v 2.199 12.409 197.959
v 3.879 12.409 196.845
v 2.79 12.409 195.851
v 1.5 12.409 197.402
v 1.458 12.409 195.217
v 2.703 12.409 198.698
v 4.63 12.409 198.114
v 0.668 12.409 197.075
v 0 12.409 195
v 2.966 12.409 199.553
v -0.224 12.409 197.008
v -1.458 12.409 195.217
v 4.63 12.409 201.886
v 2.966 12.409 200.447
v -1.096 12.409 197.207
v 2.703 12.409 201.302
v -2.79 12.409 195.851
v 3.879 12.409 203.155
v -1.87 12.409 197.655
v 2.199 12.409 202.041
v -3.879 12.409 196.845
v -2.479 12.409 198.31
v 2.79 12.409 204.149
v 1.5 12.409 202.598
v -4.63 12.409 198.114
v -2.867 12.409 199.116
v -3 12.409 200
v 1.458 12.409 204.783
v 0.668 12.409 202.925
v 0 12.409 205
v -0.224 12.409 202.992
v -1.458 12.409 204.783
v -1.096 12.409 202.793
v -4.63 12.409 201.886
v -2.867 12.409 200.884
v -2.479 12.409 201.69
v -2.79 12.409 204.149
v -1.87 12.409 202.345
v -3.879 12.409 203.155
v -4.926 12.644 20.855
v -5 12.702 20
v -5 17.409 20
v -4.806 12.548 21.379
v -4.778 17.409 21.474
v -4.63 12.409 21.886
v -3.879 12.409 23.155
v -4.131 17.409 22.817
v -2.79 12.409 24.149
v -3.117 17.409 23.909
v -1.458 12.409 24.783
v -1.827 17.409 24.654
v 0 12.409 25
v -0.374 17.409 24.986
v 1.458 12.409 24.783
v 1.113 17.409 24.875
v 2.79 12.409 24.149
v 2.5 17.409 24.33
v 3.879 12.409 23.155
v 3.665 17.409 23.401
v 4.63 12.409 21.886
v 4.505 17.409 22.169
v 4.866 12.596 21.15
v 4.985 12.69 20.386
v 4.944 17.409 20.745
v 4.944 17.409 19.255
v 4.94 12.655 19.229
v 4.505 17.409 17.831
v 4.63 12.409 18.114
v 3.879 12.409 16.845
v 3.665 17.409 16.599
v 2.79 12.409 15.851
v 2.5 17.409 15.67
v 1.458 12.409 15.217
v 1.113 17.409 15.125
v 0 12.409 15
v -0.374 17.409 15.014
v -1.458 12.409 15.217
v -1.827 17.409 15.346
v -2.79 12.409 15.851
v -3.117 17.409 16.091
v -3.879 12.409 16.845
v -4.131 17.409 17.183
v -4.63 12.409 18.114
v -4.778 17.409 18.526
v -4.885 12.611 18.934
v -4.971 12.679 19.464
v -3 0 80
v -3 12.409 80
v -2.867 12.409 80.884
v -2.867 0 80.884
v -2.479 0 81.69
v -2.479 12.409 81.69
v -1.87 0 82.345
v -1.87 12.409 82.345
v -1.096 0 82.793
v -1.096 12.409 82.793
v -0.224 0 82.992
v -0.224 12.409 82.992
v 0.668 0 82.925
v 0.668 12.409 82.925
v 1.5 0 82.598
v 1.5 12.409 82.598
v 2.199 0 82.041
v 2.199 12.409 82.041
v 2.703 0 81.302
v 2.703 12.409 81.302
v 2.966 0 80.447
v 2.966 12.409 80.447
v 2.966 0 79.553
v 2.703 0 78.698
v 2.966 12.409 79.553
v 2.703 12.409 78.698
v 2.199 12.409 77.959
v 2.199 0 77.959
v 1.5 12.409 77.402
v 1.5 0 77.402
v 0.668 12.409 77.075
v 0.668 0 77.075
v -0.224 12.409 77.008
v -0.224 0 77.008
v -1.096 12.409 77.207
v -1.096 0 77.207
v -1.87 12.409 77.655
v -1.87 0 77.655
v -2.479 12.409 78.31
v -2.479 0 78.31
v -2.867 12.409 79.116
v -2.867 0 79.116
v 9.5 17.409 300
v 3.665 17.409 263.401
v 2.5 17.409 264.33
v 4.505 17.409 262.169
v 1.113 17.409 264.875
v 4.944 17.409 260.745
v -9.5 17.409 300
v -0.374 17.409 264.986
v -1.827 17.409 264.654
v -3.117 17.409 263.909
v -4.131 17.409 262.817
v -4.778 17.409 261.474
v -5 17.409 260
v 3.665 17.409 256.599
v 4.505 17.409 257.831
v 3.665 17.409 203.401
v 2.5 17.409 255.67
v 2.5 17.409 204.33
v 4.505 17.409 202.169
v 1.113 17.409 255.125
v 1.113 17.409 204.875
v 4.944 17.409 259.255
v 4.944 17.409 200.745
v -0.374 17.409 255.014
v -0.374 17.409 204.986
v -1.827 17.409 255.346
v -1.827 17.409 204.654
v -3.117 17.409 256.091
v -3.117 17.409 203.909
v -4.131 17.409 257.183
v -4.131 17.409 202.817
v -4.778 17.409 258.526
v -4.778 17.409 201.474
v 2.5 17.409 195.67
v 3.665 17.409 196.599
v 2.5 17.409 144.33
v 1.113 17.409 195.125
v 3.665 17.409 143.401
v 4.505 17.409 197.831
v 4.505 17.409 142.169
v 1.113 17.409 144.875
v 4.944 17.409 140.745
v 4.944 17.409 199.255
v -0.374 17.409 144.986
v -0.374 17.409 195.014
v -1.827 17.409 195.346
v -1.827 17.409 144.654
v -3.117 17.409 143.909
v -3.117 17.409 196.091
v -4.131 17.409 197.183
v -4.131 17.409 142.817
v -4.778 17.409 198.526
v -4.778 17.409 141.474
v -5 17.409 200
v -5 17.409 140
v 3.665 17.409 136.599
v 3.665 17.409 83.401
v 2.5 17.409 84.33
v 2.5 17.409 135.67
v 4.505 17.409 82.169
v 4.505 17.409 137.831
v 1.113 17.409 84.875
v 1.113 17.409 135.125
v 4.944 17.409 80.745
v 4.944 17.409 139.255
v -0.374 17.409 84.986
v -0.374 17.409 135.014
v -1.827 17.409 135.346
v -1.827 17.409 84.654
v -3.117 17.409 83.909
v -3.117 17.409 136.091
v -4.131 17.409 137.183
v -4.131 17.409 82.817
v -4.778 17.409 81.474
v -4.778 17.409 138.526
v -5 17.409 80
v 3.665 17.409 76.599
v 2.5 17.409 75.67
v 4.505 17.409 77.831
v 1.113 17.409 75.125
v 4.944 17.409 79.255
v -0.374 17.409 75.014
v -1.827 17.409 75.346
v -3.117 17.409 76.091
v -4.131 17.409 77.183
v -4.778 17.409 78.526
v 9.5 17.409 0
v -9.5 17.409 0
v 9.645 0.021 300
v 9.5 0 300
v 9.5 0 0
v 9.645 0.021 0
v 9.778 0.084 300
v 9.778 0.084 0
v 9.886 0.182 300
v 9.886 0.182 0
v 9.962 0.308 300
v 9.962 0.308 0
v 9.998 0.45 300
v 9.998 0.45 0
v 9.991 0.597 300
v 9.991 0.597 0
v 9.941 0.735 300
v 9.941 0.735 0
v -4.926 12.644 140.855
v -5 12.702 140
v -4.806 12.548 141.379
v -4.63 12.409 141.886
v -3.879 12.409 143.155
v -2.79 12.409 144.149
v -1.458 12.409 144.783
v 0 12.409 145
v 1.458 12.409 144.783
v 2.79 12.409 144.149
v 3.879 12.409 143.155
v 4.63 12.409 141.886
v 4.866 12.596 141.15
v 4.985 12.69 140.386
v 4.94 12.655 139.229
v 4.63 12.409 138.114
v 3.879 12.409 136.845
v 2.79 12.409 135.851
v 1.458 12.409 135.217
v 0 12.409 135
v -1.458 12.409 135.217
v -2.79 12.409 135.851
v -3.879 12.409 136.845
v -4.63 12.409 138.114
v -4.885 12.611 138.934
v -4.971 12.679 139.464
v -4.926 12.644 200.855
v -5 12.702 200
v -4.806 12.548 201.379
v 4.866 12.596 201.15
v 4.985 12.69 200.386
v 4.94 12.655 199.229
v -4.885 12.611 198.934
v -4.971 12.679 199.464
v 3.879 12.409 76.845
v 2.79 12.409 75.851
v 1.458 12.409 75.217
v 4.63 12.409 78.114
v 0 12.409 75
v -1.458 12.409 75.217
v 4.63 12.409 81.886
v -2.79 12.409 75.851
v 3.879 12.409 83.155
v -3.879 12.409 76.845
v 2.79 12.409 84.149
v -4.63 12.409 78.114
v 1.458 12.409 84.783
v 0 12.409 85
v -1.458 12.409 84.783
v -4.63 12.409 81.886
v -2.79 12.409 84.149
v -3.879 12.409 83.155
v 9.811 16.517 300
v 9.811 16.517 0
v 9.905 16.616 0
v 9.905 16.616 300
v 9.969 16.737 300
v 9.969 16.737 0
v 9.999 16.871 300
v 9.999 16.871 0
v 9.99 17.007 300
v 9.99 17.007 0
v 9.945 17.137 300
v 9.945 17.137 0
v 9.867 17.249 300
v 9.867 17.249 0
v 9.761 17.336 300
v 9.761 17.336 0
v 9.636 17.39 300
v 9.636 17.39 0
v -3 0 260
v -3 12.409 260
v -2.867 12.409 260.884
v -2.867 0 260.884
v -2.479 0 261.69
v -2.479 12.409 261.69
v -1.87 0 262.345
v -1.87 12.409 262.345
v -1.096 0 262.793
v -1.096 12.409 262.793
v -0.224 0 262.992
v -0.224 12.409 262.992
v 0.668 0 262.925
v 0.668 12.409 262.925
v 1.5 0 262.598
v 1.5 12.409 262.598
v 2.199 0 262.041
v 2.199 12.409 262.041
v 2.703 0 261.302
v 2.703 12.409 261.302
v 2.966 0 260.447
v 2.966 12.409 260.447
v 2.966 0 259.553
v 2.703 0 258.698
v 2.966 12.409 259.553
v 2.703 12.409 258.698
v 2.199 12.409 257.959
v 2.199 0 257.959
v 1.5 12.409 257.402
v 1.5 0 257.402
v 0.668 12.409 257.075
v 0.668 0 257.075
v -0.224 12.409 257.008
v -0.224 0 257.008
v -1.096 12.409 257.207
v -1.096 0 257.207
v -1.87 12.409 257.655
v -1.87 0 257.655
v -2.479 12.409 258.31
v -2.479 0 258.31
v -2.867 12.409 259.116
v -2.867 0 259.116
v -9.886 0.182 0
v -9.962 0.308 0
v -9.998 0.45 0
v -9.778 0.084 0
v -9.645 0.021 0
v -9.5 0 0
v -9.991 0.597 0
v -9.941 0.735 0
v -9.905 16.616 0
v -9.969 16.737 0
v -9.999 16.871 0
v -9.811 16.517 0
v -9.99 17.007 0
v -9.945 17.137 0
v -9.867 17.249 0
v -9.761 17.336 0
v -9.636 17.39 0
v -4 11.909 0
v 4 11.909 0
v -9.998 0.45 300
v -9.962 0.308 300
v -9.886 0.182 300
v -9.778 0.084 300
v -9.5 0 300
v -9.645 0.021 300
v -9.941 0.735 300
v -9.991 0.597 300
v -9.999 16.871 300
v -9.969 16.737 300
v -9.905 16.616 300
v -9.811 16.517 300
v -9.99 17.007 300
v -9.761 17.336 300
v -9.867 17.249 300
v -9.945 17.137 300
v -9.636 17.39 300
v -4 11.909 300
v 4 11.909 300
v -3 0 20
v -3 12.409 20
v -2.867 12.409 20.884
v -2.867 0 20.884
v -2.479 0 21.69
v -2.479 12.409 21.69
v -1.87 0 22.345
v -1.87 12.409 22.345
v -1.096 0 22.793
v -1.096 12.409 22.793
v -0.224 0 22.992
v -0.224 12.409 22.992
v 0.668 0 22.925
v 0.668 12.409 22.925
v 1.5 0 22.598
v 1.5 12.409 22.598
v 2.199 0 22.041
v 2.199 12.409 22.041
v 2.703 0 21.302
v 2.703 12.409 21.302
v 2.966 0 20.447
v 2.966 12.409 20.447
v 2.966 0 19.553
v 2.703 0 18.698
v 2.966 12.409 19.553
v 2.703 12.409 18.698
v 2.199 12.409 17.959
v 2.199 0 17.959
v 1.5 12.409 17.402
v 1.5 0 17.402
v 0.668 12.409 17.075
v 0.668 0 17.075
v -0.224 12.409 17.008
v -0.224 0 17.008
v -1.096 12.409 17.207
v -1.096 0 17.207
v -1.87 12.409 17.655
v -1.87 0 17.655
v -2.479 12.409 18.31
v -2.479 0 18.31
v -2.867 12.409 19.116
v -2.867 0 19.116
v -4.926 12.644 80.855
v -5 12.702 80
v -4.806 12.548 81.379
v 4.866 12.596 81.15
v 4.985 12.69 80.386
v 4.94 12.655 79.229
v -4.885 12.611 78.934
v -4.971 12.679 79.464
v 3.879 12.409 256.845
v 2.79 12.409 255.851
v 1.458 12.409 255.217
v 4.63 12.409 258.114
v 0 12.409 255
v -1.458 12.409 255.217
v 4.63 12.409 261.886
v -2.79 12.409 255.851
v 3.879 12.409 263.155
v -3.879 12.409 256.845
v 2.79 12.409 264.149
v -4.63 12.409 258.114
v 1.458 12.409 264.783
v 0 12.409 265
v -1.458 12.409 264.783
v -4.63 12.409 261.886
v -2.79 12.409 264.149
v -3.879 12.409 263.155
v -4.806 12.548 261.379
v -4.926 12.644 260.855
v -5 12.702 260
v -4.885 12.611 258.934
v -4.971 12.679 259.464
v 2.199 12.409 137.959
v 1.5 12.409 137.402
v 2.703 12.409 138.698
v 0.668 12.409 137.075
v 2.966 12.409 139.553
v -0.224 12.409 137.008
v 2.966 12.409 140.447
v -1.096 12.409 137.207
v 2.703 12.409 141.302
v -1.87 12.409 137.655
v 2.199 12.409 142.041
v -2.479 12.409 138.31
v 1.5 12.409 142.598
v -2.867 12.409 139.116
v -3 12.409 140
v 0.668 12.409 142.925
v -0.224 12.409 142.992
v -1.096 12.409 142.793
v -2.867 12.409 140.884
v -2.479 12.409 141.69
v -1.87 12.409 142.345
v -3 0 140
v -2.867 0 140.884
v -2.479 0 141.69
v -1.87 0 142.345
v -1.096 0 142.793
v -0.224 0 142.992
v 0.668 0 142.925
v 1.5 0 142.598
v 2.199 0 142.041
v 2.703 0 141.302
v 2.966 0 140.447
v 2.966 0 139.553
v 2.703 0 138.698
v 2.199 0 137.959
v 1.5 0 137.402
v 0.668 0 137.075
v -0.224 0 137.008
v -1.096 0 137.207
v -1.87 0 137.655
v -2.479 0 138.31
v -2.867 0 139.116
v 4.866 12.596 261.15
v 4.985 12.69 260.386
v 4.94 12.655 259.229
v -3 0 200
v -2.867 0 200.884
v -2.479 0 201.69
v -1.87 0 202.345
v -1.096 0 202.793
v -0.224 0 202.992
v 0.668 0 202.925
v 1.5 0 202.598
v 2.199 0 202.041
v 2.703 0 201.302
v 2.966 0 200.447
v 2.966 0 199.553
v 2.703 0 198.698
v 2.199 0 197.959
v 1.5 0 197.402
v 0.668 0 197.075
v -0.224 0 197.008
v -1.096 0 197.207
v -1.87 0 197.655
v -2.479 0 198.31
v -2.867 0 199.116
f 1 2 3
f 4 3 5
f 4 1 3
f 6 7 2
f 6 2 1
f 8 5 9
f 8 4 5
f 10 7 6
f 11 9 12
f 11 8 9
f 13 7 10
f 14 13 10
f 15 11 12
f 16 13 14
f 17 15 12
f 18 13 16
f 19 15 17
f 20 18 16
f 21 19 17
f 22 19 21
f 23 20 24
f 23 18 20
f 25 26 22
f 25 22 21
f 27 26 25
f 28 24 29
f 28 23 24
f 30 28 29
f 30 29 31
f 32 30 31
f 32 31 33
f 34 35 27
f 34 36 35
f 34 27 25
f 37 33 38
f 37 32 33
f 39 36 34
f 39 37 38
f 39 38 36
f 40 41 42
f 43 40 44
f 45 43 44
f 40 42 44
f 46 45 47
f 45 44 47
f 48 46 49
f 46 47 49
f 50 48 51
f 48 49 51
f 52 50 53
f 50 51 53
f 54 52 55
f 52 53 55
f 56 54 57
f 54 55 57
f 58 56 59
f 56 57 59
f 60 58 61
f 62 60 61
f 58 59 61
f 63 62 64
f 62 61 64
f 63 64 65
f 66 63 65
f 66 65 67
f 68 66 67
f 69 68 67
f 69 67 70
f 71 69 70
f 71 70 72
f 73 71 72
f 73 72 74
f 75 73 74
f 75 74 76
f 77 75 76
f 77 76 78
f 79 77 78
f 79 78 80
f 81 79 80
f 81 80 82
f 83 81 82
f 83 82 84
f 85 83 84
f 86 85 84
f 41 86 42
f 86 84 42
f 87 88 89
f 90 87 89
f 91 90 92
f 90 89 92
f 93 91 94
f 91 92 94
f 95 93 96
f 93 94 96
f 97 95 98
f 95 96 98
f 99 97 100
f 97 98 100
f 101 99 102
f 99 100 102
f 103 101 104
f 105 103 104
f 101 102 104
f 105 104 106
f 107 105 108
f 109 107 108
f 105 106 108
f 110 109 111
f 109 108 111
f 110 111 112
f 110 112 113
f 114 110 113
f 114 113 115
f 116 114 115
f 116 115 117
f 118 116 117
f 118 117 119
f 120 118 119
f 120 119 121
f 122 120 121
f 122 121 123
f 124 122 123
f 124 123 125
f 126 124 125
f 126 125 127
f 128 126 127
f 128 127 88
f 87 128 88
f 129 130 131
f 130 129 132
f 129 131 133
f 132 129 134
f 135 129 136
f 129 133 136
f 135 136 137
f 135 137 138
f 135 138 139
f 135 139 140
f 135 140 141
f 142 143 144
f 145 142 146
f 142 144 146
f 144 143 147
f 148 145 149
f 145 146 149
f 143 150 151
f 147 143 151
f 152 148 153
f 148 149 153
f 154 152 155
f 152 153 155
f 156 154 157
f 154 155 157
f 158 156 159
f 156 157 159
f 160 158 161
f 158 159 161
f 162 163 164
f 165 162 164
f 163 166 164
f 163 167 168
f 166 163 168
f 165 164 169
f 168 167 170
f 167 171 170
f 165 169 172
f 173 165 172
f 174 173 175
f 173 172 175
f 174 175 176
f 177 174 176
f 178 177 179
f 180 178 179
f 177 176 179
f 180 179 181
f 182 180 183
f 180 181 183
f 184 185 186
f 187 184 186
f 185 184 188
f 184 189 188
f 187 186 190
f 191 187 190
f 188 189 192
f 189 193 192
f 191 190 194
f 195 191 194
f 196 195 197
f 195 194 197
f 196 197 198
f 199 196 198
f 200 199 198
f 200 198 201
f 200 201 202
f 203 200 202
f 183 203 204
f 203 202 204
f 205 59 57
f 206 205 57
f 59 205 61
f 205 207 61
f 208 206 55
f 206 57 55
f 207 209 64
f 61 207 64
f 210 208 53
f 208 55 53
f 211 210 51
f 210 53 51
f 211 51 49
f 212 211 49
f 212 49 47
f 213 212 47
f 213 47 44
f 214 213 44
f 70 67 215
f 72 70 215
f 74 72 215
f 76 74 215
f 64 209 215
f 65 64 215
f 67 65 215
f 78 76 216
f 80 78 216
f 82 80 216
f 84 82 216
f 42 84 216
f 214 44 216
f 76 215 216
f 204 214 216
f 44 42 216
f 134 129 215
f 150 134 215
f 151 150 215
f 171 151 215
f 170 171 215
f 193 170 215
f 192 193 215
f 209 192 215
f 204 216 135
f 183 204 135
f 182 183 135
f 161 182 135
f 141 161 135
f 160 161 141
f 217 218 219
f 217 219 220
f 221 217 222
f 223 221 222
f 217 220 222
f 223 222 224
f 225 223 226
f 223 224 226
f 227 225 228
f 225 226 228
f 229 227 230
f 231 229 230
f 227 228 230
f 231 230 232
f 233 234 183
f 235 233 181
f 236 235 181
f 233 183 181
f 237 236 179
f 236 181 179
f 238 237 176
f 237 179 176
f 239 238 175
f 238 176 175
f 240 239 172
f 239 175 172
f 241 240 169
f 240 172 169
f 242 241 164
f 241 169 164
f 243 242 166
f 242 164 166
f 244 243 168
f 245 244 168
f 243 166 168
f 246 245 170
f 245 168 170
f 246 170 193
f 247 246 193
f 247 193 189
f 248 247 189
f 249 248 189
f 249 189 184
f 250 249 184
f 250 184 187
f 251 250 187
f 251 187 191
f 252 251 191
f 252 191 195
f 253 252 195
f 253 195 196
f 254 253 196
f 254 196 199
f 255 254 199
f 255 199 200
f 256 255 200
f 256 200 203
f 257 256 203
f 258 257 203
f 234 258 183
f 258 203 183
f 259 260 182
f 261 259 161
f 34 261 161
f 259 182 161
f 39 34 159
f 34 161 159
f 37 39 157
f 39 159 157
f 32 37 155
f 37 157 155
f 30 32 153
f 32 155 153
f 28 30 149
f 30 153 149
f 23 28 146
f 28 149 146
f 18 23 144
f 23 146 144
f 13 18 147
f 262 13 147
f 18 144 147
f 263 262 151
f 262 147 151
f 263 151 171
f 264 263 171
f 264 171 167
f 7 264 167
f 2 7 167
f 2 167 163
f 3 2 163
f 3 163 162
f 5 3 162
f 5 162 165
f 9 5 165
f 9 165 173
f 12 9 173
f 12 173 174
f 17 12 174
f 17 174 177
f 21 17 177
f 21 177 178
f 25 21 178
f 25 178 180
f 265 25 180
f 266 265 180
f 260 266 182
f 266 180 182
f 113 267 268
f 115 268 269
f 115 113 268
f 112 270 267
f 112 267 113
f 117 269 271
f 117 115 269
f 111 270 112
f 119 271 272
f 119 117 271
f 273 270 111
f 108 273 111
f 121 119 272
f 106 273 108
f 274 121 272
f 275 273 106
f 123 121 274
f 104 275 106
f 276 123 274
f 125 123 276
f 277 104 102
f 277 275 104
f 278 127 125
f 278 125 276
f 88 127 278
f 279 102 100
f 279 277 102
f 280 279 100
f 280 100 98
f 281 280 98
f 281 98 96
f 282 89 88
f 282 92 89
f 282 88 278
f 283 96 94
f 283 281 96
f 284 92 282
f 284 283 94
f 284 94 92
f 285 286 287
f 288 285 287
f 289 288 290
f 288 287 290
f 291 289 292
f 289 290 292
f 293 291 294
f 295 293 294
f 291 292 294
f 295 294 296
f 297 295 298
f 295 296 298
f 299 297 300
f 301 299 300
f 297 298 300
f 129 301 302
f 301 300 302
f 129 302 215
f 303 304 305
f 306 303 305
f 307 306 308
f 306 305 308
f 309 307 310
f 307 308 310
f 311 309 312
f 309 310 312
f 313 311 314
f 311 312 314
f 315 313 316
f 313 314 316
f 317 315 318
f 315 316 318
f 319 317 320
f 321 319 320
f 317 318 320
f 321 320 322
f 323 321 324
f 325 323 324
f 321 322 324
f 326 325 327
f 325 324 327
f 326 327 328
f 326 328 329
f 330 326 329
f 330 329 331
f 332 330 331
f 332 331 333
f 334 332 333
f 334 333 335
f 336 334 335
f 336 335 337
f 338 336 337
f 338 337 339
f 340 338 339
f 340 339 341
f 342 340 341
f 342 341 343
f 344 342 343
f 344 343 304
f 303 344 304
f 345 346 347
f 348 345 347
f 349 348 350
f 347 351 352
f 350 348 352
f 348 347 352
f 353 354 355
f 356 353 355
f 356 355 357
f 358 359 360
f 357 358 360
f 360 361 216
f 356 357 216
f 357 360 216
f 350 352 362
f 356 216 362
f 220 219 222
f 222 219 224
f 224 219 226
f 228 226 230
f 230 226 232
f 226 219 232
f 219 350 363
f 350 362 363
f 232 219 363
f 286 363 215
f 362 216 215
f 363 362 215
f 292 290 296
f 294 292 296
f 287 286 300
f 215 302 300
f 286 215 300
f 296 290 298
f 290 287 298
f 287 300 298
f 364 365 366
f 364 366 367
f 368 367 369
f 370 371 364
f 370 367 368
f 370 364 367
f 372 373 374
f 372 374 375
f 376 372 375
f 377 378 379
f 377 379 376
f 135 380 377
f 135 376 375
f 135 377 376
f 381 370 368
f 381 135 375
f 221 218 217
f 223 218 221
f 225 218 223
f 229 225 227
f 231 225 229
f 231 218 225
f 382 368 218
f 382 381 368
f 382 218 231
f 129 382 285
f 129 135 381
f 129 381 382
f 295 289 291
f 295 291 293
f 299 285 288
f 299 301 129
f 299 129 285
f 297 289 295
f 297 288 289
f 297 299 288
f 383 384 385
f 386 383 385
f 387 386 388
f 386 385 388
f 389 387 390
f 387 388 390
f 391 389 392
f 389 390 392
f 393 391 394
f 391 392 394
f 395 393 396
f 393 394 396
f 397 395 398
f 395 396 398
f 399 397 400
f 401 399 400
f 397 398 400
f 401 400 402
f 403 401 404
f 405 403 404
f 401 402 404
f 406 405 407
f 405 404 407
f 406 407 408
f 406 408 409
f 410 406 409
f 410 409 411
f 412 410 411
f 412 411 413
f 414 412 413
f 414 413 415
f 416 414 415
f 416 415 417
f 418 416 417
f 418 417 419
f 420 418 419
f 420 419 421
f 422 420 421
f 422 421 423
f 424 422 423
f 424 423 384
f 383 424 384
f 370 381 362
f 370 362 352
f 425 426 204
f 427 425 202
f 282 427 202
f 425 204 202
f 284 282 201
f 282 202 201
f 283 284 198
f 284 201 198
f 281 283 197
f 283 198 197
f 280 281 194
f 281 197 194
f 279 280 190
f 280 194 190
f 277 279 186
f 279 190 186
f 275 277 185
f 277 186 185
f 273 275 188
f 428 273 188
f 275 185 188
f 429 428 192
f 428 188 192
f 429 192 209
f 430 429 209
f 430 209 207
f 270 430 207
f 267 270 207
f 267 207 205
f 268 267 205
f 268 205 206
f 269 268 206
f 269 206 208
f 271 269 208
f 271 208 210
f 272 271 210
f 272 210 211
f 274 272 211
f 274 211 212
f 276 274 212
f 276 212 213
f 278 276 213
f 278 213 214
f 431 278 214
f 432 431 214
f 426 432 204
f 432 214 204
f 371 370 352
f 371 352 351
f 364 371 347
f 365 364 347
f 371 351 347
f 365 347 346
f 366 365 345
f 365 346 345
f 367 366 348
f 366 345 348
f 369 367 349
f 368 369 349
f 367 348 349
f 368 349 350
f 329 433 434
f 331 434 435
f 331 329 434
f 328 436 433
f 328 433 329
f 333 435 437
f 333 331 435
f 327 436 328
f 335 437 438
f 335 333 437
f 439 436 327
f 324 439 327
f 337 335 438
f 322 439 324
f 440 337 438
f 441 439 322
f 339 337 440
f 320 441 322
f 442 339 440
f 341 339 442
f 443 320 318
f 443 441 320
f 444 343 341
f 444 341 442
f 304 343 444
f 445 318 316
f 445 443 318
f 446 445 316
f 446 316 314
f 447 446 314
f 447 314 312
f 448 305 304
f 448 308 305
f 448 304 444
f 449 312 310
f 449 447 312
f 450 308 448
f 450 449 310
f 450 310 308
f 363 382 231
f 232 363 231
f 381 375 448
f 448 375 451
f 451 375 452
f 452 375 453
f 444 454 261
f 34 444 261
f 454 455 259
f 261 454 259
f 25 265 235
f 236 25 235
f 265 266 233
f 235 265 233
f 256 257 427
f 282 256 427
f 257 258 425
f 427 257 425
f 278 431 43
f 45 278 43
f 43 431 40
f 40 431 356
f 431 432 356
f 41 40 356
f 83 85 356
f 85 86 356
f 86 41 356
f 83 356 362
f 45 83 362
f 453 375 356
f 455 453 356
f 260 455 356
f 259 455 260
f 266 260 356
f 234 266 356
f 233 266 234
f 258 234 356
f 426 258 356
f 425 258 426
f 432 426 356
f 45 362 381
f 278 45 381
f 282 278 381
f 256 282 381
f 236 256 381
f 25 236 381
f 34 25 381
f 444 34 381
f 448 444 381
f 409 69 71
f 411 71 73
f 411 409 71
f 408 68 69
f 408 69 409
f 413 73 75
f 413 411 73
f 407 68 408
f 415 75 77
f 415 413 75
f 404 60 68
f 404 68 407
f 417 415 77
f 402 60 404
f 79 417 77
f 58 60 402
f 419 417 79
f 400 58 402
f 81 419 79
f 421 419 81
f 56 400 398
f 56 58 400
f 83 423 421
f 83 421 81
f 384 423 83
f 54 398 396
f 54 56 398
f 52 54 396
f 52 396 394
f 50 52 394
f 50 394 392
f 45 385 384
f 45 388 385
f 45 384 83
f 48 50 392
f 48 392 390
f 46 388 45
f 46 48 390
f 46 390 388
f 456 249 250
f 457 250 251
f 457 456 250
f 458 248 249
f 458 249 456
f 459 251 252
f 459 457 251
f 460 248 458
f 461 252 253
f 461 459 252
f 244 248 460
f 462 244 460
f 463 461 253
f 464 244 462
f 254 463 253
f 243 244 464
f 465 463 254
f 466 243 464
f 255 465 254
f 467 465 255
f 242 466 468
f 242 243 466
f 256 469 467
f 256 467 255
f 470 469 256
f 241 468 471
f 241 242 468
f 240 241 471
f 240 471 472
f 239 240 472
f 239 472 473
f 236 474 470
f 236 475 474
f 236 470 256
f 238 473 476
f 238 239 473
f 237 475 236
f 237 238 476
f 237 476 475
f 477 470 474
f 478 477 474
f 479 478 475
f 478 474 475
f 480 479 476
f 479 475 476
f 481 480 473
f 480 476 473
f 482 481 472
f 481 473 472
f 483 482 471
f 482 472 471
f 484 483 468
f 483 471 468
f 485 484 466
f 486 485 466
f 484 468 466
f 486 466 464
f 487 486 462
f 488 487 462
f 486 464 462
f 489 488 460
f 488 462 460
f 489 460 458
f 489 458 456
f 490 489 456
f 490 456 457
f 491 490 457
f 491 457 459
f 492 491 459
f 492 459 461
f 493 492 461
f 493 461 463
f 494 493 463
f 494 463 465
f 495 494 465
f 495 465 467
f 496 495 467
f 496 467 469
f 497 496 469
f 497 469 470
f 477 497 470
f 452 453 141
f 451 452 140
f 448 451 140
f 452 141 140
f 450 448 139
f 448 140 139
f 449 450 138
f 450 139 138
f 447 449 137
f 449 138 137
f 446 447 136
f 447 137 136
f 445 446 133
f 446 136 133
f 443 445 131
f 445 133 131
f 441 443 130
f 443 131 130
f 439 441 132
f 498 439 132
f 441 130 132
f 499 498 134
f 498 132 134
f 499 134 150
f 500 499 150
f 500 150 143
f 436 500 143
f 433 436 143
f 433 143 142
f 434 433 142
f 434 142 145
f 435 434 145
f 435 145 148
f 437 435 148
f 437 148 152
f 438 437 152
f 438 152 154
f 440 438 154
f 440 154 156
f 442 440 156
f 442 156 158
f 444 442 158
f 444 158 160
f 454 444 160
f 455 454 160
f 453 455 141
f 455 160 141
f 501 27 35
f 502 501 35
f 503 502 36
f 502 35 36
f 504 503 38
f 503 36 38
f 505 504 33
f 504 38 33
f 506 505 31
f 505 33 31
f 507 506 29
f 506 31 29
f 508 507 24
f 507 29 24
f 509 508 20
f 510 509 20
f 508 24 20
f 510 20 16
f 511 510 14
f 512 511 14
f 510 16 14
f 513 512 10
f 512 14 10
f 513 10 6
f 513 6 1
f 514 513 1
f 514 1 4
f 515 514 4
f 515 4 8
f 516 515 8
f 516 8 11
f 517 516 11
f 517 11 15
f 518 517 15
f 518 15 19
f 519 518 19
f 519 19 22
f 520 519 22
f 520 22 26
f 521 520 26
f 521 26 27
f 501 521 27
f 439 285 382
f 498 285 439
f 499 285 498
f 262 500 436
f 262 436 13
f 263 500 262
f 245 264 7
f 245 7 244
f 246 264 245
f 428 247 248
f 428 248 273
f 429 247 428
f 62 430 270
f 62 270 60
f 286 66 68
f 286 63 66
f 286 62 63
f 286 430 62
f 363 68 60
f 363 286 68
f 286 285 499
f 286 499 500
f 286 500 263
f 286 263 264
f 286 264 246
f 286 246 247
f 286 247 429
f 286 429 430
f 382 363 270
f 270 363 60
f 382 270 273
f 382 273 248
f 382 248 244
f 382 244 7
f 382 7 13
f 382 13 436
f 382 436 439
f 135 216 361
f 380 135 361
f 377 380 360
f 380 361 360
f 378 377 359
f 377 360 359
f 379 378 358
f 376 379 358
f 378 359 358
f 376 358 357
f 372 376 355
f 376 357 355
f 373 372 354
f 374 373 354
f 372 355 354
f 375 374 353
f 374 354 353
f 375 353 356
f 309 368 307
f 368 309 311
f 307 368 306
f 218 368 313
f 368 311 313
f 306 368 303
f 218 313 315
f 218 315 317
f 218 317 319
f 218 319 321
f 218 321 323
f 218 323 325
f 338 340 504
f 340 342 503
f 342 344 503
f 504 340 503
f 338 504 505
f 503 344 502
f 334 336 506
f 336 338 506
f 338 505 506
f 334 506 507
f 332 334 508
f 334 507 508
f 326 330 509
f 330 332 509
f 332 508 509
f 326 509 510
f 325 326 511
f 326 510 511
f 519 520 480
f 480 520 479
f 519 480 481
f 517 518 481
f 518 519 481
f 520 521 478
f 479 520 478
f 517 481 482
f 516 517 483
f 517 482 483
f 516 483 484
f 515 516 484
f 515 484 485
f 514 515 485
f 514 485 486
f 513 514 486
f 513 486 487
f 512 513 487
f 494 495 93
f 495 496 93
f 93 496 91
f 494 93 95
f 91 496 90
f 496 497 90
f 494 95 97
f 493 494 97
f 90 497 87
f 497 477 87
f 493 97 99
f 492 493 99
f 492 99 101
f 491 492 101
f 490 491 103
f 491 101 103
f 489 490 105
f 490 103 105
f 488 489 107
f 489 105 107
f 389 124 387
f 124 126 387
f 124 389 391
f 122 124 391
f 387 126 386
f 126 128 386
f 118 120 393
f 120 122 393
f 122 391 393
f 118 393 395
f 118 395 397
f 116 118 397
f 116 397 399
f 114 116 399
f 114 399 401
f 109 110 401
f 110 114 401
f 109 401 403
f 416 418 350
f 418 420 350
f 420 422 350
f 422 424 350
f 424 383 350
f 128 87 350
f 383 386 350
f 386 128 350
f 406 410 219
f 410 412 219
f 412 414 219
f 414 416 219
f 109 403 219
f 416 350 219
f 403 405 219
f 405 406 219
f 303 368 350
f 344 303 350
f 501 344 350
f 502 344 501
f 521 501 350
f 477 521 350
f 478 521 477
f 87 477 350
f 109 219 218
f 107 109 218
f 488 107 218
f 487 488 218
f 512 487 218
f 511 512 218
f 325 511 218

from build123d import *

# Parameters (mm, degrees)
PAD_DEPTH       = 300
SKETCH001_R     = 3
POCKET_DEPTH    = 17.410023
SKETCH002_R     = 5
POCKET001_DEPTH = 5


with BuildPart() as part:
    # Sketch → Pad (new body)
    with BuildSketch(Plane.XY):
        with BuildLine():
            Line((-9.5, 0), (9.5, 0))
            ThreePointArc((9.5, 0), (9.928584, 0.242481), (9.941474, 0.734736))
            Line((4, 11.909023), (9.941474, 0.734736))
            Line((9.810688, 16.517266), (4, 11.909023))
            ThreePointArc((9.810688, 16.517266), (9.972164, 17.073525), (9.5, 17.409023))
            Line((9.5, 17.409023), (-9.5, 17.409023))
            ThreePointArc((-9.5, 17.409023), (-9.972164, 17.073525), (-9.810688, 16.517266))
            Line((-9.810688, 16.517266), (-4, 11.909023))
            Line((-4, 11.909023), (-9.941474, 0.734736))
            ThreePointArc((-9.941474, 0.734736), (-9.928584, 0.242481), (-9.5, 0))
        make_face()
    extrude(amount=PAD_DEPTH)

    # Sketch001 (on Face2 of Pad) → Pocket (cut, through all)
    with BuildSketch(Plane(origin=(0, 17.409023, 0), x_dir=(-1, 0, 0), z_dir=(0, 1, 0))):
        with Locations((0, 20)):
            Circle(SKETCH001_R)
        with Locations((0, 80)):
            Circle(SKETCH001_R)
        with Locations((0, 140)):
            Circle(SKETCH001_R)
        with Locations((0, 200)):
            Circle(SKETCH001_R)
        with Locations((0, 260)):
            Circle(SKETCH001_R)
    extrude(amount=-POCKET_DEPTH, mode=Mode.SUBTRACT)

    # Sketch002 (on Face3 of Pocket) → Pocket001 (cut)
    with BuildSketch(Plane(origin=(0, 17.409023, 0), x_dir=(-1, 0, 0), z_dir=(0, 1, 0))):
        with Locations((0, 260)):
            Circle(SKETCH002_R)
        with Locations((0, 200)):
            Circle(SKETCH002_R)
        with Locations((0, 140)):
            Circle(SKETCH002_R)
        with Locations((0, 80)):
            Circle(SKETCH002_R)
        with Locations((0, 20)):
            Circle(SKETCH002_R)
    extrude(amount=-POCKET001_DEPTH, mode=Mode.SUBTRACT)


solid = part.part
